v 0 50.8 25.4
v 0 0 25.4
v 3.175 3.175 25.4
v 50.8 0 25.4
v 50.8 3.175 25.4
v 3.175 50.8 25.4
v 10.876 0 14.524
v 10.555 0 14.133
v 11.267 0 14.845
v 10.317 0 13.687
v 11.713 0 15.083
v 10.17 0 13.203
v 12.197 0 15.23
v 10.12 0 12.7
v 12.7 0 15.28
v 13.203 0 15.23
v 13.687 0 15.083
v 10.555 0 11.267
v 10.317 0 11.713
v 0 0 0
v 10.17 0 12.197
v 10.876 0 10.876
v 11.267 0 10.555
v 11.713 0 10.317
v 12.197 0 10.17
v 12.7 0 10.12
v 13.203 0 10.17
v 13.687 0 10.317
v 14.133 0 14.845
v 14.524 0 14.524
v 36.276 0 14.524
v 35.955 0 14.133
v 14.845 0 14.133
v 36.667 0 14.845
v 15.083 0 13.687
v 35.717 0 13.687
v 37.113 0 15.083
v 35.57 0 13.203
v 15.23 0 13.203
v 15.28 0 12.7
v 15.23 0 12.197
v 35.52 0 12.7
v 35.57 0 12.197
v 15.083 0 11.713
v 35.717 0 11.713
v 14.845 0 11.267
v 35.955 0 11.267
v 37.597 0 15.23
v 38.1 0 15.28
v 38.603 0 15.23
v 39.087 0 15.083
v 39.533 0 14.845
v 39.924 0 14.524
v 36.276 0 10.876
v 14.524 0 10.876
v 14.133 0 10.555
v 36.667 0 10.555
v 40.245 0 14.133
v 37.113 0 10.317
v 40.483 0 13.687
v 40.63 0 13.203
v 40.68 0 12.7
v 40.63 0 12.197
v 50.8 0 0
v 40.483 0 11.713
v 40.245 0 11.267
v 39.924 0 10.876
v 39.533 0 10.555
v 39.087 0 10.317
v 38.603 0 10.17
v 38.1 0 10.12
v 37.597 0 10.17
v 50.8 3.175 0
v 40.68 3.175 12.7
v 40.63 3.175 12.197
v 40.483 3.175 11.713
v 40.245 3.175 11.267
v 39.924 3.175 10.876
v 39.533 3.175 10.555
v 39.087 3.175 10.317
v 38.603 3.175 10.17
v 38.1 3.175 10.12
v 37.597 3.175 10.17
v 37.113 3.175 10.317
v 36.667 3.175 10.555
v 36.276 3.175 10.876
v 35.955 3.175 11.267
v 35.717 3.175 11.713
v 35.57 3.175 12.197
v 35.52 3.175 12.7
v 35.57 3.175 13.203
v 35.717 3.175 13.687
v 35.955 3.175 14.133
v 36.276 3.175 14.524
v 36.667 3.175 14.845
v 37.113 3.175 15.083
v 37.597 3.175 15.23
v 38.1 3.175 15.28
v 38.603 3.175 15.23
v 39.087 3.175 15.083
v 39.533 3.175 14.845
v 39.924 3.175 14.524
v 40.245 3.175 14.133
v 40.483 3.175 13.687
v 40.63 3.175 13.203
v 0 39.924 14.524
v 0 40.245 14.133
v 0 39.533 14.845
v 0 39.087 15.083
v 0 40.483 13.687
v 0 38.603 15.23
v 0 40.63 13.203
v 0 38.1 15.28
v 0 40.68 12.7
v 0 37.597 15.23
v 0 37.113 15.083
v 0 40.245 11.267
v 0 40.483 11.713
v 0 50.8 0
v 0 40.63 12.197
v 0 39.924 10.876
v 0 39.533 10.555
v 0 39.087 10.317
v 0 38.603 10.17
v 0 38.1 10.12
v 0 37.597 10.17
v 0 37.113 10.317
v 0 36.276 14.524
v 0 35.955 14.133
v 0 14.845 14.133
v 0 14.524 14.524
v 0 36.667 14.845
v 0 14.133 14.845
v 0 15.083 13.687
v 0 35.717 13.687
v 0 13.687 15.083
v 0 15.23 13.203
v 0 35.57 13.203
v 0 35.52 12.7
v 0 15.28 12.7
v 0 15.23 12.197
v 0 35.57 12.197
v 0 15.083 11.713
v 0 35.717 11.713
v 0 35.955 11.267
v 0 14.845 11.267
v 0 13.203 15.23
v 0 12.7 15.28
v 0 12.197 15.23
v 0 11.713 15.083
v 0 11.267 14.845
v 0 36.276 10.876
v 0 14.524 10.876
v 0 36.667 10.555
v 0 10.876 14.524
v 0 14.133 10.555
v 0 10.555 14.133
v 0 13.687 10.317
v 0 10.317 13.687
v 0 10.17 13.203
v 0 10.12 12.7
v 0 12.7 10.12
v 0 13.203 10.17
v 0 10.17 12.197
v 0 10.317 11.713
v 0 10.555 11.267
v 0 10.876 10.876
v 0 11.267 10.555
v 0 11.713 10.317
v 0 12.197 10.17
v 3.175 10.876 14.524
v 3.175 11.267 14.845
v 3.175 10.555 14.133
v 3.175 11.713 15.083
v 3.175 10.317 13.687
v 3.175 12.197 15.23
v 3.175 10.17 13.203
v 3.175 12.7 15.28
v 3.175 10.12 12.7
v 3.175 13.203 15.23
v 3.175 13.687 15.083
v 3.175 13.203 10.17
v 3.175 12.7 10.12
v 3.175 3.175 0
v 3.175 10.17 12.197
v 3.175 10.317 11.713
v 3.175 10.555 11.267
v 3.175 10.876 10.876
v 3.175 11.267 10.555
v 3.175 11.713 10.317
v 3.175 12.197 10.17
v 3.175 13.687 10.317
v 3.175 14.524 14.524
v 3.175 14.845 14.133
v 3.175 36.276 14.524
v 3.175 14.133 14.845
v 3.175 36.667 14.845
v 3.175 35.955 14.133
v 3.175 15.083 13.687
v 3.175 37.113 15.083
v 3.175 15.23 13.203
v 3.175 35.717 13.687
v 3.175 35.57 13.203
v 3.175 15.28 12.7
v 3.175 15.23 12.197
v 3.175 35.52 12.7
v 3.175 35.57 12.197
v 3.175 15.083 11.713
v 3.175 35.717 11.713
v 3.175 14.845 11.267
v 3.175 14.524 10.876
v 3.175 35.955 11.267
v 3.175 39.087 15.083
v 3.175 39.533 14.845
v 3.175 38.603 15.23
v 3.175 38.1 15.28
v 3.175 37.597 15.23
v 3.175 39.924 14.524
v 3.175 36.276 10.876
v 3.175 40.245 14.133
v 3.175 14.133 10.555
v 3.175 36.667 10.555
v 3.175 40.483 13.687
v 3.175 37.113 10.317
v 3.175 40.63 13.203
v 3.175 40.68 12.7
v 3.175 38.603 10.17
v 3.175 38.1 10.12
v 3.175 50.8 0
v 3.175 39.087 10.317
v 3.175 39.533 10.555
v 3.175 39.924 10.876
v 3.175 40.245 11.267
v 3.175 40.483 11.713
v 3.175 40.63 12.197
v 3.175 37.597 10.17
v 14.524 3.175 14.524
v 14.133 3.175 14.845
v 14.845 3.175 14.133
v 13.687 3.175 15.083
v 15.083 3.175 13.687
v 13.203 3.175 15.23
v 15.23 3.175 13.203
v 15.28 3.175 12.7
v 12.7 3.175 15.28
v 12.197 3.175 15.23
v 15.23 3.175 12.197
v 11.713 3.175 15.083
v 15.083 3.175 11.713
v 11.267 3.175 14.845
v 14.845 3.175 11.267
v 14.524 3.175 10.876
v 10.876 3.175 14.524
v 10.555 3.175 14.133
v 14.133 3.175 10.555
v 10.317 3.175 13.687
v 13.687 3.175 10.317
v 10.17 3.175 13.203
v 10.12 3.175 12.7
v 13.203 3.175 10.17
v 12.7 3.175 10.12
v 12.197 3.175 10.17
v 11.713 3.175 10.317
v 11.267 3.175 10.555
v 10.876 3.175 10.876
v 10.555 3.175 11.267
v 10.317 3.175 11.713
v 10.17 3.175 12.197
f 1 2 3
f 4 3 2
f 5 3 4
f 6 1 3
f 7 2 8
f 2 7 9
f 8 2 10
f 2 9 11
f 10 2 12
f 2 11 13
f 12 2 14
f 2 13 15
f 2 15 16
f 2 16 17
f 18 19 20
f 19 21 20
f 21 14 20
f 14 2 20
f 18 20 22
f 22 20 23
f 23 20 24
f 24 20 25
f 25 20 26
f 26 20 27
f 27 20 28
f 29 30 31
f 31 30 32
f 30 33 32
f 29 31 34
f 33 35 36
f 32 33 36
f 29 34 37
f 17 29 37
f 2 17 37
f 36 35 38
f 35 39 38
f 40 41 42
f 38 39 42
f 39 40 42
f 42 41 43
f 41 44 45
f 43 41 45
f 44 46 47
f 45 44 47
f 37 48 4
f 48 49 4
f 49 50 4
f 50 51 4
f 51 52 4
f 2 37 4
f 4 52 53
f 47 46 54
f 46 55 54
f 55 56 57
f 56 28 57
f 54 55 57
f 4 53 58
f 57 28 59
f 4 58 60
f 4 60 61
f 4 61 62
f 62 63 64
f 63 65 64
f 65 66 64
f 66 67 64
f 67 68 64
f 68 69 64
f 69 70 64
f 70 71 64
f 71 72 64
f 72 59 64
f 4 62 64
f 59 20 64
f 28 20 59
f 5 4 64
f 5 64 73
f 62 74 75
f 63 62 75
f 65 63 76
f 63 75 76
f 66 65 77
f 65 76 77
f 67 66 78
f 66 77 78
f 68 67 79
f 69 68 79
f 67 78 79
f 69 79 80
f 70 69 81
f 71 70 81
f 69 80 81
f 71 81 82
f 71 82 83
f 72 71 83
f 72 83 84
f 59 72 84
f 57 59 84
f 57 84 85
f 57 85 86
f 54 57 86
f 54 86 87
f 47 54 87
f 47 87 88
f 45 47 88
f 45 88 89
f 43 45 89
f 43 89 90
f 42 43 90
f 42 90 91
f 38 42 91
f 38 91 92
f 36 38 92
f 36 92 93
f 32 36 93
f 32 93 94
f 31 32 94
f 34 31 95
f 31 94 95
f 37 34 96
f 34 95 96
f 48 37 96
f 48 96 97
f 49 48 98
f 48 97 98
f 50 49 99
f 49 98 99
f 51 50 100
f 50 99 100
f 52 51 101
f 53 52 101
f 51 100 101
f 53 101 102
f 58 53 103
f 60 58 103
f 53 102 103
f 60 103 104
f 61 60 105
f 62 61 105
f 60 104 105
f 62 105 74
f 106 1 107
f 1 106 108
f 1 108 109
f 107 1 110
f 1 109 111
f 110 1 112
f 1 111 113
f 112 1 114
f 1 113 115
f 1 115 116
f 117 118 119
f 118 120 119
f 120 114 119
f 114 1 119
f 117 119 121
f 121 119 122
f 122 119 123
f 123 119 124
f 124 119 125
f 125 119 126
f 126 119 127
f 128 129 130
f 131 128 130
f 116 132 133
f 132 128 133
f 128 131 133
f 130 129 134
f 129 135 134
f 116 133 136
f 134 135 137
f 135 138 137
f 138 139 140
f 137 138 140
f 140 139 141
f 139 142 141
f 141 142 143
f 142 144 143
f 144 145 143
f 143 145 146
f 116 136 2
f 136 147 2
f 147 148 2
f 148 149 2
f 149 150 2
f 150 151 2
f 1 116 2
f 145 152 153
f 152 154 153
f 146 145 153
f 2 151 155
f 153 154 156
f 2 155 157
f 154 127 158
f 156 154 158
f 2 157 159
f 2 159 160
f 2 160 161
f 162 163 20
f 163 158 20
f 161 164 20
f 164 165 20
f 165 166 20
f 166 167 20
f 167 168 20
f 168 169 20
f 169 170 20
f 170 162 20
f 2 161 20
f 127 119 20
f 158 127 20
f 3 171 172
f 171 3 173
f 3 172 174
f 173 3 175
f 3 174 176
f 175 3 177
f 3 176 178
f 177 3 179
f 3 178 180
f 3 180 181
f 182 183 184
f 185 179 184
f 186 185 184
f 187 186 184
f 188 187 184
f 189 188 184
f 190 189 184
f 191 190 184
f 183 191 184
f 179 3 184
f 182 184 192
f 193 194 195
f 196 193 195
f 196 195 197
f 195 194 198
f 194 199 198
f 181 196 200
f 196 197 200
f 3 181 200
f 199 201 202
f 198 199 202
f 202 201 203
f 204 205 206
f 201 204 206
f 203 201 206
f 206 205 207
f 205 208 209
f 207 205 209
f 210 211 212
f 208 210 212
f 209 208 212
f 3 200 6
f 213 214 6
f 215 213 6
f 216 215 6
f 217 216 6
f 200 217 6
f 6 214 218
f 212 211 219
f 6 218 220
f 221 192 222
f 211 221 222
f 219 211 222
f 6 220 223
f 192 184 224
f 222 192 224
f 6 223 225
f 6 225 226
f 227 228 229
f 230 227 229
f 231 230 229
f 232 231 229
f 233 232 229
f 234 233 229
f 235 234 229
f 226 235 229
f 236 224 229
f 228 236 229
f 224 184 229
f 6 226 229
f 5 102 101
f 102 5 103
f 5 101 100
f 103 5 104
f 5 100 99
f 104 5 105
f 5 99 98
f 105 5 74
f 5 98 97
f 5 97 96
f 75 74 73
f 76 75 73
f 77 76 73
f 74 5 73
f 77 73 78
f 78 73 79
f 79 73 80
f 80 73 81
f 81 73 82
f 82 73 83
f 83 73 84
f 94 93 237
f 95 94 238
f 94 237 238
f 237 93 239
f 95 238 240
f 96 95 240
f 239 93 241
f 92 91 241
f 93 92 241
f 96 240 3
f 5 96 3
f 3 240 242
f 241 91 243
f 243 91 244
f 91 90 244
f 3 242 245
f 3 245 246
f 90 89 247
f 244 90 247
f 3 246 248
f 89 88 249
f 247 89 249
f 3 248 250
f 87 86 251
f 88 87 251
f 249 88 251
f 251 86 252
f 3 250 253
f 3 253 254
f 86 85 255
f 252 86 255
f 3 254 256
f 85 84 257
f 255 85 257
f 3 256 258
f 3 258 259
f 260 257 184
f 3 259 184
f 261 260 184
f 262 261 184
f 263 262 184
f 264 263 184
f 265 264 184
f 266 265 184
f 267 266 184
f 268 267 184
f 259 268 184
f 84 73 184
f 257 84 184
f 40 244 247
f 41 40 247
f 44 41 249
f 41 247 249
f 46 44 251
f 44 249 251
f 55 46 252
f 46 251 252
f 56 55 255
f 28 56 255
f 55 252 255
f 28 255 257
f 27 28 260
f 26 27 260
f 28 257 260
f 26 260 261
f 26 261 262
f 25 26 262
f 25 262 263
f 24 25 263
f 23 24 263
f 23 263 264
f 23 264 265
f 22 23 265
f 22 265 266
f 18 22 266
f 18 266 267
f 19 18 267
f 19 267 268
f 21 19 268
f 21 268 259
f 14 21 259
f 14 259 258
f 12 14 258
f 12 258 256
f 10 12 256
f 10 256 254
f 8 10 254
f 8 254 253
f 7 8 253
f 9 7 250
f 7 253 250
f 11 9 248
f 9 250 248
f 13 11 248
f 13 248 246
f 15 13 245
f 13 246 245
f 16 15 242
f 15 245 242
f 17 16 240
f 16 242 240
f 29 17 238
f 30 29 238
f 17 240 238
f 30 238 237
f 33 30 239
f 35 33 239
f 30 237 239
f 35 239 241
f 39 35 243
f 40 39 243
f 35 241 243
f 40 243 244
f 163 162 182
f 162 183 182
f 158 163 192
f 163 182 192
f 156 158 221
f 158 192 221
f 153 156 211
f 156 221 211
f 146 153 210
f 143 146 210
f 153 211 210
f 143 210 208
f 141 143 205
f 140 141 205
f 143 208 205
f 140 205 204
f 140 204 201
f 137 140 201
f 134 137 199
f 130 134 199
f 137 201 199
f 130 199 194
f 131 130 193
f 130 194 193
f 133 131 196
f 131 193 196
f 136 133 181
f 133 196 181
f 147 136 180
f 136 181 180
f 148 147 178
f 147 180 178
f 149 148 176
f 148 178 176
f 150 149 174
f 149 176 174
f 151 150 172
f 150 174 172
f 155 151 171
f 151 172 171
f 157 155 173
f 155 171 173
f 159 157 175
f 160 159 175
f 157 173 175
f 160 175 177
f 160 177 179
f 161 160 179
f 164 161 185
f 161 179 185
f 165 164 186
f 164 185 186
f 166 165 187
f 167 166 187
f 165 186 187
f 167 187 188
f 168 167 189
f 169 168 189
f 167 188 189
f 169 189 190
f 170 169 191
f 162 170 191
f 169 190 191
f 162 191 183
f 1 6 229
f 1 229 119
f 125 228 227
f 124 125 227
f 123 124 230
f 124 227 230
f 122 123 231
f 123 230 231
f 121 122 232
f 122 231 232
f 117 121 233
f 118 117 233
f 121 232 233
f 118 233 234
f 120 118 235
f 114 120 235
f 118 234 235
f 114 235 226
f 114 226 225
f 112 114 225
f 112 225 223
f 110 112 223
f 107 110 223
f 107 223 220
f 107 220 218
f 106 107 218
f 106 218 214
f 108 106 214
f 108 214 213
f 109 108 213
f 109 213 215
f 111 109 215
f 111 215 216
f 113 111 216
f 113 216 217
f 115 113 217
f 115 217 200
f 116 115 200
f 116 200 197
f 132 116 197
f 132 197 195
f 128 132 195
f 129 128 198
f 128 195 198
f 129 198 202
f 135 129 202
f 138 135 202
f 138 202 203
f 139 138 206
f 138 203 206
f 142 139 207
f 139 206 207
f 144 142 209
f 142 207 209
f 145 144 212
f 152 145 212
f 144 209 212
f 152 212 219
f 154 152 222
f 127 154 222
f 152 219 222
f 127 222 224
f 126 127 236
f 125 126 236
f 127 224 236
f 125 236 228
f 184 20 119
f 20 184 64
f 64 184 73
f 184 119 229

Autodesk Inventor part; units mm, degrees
ref_plane "YZ Plane" through (0, 0, 0) normal (1, 0, 0) x (0, 1, 0)
ref_plane "XZ Plane" through (0, 0, 0) normal (0, 1, 0) x (-1, 0, 0)
ref_plane "XY Plane" through (0, 0, 0) normal (0, 0, 1) x (1, 0, 0)
sketch "Sketch1" plane through (0, 0, 0) normal (0, 0, 1) x (1, 0, 0)
  line L0 (0, 0) -> (3.175, 0)
  line L1 (3.175, 0) -> (3.175, 50.8)
  line L2 (3.175, 50.8) -> (0, 50.8)
  line L3 (0, 50.8) -> (0, 0)
  line L4 (0, 0) -> (50.8, 0)
  line L5 (50.8, 0) -> (50.8, 3.175)
  line L6 (50.8, 3.175) -> (0, 3.175)
  line L7 (0, 3.175) -> (0, 0)
  dimension "d0" = 3.175
  dimension "d1" = 50.8
  dimension "d2" = 50.8
  dimension "d3" = 3.175
extrude "Extrusion1" add sketch "Sketch1" along normal blind 25.4
sketch "Sketch2" plane through (3.175, 3.175, 0) normal (1, 0, 0) x (0, 0, -1)
  line L0 (0, 47.625) -> (-25.4, 47.625) construction
  line L1 (0, 0) -> (-25.4, 0) construction
  line L2 (-12.7, 0) -> (-12.7, 9.525) construction
  circle A0 centre (-12.7, 9.525) radius 2.5797
  line L3 (-12.7, 9.525) -> (-12.7, 34.925) construction
  circle A1 centre (-12.7, 34.925) radius 2.5797
  point P0 (0, -3.175)
  dimension "d18" = 9.525
  dimension "d19" = 5.1594
  dimension "d22" = 25.4
  dimension "d23" = 5.1594
extrude "Extrusion2" cut sketch "Sketch2" against normal blind 25.4
sketch "Sketch3" plane through (3.175, 3.175, 0) normal (0, 1, 0) x (1, 0, 0)
  line L0 (0, 0) -> (0, -25.4) construction
  line L1 (0, -12.7) -> (9.525, -12.7) construction
  circle A0 centre (9.525, -12.7) radius 2.5797
  line L2 (9.525, -12.7) -> (34.925, -12.7) construction
  circle A1 centre (34.925, -12.7) radius 2.5797
  point P0 (-3.175, 0)
  dimension "d12" = 9.525
  dimension "d13" = 5.1594
  dimension "d14" = 25.4
  dimension "d15" = 5.1594
extrude "Extrusion3" cut sketch "Sketch3" against normal blind 25.4
properties part number "LV Gusset"
